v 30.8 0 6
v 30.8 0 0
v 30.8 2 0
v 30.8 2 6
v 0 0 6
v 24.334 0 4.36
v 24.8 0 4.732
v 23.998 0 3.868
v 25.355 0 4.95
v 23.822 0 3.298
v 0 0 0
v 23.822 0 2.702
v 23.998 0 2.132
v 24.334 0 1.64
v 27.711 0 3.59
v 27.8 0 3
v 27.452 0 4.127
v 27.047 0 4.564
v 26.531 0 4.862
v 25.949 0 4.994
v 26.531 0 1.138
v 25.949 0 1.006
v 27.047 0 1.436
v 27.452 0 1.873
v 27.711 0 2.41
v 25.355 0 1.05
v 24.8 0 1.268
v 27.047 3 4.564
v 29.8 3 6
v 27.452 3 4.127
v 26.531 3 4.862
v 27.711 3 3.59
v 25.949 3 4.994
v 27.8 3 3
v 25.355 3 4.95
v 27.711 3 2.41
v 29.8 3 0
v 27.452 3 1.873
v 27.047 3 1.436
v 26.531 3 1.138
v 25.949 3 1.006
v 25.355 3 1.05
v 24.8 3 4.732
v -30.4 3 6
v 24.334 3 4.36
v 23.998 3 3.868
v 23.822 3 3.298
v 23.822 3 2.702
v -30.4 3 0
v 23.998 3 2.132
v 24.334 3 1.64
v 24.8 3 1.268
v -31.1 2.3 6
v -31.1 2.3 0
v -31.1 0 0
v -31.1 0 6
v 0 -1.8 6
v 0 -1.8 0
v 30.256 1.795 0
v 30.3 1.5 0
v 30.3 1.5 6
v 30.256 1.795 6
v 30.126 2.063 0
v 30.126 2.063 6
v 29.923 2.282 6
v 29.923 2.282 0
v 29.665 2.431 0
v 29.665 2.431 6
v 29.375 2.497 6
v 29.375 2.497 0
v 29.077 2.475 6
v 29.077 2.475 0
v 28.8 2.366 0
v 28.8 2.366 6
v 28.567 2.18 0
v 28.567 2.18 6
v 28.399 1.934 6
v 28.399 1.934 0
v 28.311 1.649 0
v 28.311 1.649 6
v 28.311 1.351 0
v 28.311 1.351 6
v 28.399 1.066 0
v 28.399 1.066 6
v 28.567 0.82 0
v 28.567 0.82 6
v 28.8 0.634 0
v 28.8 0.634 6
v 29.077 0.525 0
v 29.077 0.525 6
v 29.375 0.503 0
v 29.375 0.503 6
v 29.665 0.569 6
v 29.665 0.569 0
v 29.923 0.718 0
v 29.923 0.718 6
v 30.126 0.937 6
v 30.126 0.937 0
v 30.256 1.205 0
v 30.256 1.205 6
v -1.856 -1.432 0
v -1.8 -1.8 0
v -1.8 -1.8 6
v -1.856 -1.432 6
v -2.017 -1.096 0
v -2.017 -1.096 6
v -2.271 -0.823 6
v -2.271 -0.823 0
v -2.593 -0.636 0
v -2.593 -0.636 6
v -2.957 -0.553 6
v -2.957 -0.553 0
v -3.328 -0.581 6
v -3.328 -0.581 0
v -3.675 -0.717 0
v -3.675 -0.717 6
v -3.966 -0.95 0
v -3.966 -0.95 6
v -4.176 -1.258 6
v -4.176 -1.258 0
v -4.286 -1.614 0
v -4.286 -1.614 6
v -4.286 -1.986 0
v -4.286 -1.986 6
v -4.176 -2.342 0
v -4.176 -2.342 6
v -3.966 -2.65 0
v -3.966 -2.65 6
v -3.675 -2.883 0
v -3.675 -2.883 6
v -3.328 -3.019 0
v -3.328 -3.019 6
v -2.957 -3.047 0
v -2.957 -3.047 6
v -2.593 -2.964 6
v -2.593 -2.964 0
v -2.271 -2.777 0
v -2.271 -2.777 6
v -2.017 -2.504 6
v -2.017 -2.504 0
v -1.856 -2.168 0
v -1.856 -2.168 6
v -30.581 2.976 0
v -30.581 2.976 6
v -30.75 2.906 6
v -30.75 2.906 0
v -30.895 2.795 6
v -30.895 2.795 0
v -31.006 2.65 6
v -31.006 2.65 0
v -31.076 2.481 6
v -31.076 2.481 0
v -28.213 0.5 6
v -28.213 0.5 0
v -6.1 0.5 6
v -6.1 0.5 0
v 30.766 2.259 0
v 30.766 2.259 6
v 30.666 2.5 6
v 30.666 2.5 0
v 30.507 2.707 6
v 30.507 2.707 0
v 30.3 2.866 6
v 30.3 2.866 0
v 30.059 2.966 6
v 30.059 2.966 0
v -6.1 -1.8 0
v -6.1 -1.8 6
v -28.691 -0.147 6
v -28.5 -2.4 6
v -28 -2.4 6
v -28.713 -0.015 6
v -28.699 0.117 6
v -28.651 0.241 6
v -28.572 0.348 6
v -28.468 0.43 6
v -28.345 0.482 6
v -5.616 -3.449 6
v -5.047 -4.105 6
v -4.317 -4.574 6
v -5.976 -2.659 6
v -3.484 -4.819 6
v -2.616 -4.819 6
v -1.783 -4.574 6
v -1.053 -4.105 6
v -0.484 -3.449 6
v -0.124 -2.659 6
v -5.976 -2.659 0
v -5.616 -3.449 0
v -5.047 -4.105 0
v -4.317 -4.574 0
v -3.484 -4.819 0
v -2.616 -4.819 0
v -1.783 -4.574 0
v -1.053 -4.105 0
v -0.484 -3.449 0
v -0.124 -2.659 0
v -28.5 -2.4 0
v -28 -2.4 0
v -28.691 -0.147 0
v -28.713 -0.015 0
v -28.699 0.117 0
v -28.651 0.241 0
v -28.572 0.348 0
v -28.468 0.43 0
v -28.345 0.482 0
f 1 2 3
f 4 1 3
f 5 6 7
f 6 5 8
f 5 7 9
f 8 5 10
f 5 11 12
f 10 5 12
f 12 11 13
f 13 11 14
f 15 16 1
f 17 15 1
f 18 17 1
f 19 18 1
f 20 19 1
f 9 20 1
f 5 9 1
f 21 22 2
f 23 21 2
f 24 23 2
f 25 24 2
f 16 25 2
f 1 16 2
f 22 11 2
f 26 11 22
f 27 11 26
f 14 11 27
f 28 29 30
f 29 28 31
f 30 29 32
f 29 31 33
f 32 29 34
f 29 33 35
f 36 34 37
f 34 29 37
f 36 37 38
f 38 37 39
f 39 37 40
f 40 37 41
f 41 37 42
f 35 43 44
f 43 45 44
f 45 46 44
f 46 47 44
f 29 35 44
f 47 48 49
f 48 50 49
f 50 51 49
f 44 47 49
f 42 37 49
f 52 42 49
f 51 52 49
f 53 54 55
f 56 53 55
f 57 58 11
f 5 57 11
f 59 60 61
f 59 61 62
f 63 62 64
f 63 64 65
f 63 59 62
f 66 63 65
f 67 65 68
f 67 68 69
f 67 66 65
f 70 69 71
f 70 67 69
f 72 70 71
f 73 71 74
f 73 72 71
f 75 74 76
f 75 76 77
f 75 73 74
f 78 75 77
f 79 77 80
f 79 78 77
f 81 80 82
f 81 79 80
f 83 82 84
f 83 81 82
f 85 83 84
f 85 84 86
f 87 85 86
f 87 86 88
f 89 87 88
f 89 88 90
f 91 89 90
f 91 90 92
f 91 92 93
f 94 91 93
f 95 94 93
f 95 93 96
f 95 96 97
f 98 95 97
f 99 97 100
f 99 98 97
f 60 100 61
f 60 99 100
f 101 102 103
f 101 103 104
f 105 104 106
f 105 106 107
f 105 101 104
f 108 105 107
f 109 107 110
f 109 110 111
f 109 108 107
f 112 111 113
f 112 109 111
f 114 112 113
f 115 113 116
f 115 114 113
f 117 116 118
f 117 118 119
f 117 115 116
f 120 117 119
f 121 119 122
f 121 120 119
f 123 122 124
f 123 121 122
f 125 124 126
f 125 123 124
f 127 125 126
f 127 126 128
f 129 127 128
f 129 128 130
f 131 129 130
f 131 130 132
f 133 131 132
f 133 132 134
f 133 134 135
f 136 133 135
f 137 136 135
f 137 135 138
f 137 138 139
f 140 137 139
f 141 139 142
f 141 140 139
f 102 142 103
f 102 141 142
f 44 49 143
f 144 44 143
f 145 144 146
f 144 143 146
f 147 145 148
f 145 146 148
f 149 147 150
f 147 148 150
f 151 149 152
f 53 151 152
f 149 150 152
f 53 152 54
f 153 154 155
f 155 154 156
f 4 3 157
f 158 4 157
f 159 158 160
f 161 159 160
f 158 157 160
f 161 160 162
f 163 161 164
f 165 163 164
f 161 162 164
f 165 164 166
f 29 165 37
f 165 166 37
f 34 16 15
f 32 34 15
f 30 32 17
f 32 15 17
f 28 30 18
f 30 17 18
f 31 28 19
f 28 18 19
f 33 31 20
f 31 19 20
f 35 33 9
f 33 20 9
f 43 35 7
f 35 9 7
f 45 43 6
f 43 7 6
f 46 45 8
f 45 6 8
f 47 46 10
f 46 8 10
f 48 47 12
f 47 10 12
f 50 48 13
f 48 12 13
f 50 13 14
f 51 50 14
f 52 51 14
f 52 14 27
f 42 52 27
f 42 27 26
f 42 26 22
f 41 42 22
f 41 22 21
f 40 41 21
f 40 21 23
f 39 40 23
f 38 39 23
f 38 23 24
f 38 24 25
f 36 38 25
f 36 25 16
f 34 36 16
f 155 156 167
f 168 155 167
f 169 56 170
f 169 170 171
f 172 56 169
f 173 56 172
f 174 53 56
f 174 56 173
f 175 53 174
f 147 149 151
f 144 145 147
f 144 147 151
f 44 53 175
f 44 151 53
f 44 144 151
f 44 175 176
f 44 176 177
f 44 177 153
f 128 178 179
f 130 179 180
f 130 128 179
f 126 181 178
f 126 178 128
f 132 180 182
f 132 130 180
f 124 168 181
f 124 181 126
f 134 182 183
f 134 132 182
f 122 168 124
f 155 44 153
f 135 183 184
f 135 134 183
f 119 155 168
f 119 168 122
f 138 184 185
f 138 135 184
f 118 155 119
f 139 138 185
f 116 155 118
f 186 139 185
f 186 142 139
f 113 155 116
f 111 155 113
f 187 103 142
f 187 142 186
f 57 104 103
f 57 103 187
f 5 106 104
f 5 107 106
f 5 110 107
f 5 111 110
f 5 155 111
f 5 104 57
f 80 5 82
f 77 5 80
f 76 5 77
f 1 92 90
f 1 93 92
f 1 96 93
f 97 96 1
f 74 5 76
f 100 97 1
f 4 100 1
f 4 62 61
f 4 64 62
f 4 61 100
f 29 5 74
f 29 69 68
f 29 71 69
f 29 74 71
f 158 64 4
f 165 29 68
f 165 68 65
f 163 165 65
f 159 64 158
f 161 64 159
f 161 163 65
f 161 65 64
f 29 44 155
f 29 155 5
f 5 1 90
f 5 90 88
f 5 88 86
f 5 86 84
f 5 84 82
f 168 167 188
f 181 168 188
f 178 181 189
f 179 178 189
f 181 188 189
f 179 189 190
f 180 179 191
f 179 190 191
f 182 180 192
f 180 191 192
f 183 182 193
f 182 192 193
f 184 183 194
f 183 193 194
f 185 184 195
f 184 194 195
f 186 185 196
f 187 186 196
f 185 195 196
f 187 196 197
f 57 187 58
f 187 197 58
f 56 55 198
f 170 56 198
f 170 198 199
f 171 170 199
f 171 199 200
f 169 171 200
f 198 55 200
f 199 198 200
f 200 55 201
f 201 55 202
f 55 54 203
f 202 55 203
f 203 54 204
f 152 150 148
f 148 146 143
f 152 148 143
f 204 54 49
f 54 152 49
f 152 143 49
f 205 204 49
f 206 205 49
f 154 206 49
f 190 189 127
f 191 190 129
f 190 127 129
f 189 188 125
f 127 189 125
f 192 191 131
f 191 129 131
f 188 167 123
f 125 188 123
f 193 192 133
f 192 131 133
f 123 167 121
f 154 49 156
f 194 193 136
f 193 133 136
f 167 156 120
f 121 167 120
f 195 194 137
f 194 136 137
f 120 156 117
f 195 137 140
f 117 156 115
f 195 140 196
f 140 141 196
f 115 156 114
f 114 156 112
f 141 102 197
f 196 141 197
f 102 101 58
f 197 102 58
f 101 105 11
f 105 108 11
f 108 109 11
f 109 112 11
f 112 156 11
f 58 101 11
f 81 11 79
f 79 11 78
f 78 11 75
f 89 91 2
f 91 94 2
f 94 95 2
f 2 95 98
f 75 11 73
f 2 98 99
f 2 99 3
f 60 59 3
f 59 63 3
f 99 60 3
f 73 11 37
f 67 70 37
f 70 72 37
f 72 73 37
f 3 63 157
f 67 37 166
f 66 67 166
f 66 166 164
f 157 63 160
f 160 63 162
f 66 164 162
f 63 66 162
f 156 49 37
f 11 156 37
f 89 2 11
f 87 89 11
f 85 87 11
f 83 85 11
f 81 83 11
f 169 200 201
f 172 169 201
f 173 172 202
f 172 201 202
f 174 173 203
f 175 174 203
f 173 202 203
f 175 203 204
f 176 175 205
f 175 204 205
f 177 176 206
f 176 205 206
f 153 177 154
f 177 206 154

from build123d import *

# Parameters (mm, degrees)
F0_R     = 1.25
F0_R_2   = 1
F1_DEPTH = 6
F3_D     = 4


with BuildPart() as f1:
    # F0 (on Top) → F1 (new body)
    with BuildSketch(Plane.XY):
        with BuildLine():
            Line((29.8, 3), (-30.4, 3))
            ThreePointArc((-30.4, 3), (-30.894975, 2.794975), (-31.1, 2.3))
            Line((-31.1, 2.3), (-31.1, 0))
            Line((-31.1, 0), (-28.5, -2.4))
            Line((-28.5, -2.4), (-28, -2.4))
            Line((-28, -2.4), (-28.691283, -0.146644))
            ThreePointArc((-28.691283, -0.146644), (-28.615341, 0.297219), (-28.213271, 0.5))
            Line((-28.213271, 0.5), (-6.1, 0.5))
            Line((-6.1, 0.5), (-6.1, -1.8))
            ThreePointArc((-6.1, -1.8), (-3.05, -4.85), (0, -1.8))
            Line((0, -1.8), (0, 0))
            Line((0, 0), (30.8, 0))
            Line((30.8, 0), (30.8, 2))
            ThreePointArc((30.8, 2), (30.507107, 2.707107), (29.8, 3))
        make_face()
        with Locations((-3.05, -1.8)):
            Circle(F0_R, mode=Mode.SUBTRACT)
        with Locations((29.3, 1.5)):
            Circle(F0_R_2, mode=Mode.SUBTRACT)
    extrude(amount=F1_DEPTH)

    # F3 (through all)
    with Locations(Plane(origin=(0, 3, 0), x_dir=(-1, 0, 0), z_dir=(0, 1, 0))):
        with Locations((-25.8, 3)):
            Hole(F3_D / 2)


solid = f1.part
